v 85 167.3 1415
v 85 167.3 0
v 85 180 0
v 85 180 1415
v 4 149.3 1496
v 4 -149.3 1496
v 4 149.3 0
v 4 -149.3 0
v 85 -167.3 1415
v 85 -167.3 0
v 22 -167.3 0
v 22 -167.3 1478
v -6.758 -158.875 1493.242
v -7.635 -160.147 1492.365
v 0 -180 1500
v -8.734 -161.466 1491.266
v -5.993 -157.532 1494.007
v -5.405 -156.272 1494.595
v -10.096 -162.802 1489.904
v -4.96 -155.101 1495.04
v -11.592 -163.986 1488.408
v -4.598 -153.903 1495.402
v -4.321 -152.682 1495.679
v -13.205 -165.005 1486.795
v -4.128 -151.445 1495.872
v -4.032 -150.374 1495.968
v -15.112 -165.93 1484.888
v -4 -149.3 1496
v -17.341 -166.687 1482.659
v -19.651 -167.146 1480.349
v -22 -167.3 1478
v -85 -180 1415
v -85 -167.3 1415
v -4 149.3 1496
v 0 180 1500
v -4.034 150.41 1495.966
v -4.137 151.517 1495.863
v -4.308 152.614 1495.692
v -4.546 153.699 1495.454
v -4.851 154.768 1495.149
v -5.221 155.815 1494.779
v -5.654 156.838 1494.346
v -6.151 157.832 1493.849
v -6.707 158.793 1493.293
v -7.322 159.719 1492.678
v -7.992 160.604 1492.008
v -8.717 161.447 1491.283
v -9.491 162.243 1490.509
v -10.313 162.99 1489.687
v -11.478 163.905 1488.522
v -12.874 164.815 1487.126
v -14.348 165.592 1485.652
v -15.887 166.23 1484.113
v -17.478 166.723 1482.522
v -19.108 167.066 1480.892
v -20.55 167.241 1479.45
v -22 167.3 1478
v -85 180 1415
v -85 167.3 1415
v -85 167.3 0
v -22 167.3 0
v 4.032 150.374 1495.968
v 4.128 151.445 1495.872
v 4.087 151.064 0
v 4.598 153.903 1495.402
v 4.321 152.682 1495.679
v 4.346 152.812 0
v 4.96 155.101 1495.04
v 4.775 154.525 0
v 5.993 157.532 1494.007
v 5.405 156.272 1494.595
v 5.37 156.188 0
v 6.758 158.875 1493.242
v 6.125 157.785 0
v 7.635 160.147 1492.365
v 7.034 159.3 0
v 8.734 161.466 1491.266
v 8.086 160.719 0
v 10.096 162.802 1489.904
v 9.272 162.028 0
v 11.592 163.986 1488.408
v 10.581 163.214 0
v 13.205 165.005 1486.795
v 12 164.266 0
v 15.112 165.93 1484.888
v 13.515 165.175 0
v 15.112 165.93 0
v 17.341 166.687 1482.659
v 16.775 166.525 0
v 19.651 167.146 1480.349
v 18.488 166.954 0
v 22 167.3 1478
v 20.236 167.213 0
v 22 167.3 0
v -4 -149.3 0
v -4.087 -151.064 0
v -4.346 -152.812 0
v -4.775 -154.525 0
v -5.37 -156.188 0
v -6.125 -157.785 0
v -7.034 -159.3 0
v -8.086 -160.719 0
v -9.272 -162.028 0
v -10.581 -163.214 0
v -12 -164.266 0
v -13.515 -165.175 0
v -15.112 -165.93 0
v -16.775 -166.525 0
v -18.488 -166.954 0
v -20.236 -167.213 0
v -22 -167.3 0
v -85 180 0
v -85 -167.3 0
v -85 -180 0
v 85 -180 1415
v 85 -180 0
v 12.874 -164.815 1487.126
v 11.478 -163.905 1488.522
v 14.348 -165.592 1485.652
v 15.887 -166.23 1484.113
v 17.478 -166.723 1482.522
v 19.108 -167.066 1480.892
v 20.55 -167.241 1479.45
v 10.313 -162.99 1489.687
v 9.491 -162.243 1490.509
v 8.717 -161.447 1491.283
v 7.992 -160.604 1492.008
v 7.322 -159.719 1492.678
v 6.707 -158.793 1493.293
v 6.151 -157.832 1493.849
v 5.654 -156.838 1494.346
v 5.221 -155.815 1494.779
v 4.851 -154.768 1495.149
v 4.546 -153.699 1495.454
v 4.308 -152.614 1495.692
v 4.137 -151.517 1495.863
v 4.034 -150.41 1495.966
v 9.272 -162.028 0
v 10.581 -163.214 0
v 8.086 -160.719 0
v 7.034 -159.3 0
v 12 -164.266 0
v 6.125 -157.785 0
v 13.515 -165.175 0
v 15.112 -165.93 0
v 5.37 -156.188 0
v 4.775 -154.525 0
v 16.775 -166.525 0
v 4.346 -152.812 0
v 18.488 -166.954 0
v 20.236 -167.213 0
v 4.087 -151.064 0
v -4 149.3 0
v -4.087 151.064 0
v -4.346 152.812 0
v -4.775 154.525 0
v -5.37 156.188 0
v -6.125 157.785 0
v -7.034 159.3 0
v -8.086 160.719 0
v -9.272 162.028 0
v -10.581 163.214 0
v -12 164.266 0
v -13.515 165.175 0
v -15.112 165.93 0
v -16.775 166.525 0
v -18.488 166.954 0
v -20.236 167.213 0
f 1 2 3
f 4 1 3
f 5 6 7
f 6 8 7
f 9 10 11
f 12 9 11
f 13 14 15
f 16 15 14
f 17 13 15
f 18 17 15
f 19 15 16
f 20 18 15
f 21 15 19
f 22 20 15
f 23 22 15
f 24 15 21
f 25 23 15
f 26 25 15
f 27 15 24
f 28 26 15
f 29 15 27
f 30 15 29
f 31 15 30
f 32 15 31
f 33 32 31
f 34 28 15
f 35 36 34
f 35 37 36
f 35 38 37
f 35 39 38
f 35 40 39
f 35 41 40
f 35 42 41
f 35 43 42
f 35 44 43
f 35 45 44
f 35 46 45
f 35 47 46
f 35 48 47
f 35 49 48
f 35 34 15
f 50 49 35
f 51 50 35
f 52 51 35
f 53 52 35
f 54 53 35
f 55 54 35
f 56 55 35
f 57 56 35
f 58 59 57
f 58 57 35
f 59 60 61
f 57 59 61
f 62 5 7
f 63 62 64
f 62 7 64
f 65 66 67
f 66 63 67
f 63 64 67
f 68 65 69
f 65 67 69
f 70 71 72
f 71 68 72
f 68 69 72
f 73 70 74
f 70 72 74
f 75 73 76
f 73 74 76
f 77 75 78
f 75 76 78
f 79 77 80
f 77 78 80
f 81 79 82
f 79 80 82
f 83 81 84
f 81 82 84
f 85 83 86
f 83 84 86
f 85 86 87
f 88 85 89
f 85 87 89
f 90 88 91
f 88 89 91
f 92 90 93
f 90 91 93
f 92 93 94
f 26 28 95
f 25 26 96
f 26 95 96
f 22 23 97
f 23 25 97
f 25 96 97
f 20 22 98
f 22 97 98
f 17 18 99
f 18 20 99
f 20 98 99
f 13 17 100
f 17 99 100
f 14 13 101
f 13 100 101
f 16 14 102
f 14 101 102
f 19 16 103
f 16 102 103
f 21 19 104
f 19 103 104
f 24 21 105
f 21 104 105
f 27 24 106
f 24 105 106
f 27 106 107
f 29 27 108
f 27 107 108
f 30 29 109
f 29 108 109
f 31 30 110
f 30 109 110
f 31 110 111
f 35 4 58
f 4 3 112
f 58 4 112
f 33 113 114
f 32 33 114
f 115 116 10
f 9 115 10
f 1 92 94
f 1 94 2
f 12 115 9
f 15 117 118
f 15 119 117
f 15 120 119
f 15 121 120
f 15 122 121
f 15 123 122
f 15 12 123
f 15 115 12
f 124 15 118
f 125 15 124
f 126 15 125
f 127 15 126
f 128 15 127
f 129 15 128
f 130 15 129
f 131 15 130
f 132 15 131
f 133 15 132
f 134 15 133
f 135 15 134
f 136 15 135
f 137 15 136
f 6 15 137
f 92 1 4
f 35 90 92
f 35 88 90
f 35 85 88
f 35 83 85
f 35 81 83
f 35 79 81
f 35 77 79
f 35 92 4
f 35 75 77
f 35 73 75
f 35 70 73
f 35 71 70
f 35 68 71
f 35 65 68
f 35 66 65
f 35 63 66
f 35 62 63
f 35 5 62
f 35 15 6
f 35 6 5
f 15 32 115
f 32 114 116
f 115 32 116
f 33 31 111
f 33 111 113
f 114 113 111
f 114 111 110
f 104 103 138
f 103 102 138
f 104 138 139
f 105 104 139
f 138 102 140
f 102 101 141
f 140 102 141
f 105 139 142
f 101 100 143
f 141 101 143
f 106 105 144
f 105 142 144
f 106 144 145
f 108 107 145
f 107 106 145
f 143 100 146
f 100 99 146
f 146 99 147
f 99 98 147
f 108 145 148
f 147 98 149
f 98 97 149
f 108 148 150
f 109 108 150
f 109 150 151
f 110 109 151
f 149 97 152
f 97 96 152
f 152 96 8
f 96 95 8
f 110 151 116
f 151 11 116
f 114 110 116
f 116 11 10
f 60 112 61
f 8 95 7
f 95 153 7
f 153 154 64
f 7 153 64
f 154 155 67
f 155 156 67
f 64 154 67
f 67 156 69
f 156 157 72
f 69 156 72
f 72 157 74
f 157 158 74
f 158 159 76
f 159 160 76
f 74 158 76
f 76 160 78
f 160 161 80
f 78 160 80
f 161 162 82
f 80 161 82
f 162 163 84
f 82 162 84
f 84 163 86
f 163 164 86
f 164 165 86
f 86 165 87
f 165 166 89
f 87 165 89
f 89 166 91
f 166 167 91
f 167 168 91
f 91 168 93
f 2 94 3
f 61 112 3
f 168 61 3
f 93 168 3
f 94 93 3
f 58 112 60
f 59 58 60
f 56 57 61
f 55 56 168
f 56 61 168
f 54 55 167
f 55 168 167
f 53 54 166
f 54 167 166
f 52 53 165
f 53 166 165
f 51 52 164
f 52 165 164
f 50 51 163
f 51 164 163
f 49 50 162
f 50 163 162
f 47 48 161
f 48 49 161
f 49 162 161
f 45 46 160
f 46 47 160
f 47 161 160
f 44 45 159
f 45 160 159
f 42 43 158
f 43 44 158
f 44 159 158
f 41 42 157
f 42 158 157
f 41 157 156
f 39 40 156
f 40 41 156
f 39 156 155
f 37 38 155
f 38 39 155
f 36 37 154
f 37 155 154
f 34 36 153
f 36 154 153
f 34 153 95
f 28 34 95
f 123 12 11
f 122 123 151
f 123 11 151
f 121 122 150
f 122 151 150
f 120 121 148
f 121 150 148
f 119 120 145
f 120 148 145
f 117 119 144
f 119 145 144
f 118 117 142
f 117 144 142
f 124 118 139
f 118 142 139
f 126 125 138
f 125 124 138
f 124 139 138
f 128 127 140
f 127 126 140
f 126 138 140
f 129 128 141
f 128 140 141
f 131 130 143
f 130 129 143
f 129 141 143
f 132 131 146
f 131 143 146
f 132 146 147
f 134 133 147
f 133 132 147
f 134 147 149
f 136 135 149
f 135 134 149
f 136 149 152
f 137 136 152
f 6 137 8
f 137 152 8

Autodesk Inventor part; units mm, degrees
ref_plane "Start Plane" through (0, 0, 0) normal (0, 0, 1) x (1, 0, 0)
ref_plane "End Plane" through (0, 0, 1500) normal (0, 0, 1) x (1, 0, 0)
sketch "Sketch" plane through (0, 0, 0) normal (0, 0, 1) x (1, 0, 0)
  line L0 (-85, 167.3) -> (-22, 167.3)
  line L1 (-85, 180) -> (-85, 167.3)
  line L2 (85, 180) -> (-85, 180)
  line L3 (85, 167.3) -> (85, 180)
  line L4 (22, 167.3) -> (85, 167.3)
  line L5 (4, -149.3) -> (4, 149.3)
  line L6 (85, -167.3) -> (22, -167.3)
  line L7 (85, -180) -> (85, -167.3)
  line L8 (-85, -167.3) -> (-85, -180)
  line L9 (-22, -167.3) -> (-85, -167.3)
  line L10 (-4, 149.3) -> (-4, -149.3)
  line L11 (0, -252) -> (0, 252) construction
  line L12 (-4, -167.3) -> (4, -167.3) construction
  arc A0 (-22, -167.3) -> (-4, -149.3) centre (-22, -149.3) ccw
  arc A1 (-4, 149.3) -> (-22, 167.3) centre (-22, 149.3) ccw
  arc A2 (22, 167.3) -> (4, 149.3) centre (22, 149.3) ccw
  arc A3 (4, -149.3) -> (22, -167.3) centre (22, -149.3) ccw
  line L13 (-119, 0) -> (119, 0) construction
  line L14 (-85, -180) -> (85, -180)
  point P0 (-4, 167.3)
  point P1 (4, 167.3)
  point P2 (0, 0)
  point P3 (0, -167.3)
  point P4 (0, 0)
  dimension "d1" = 360
  dimension "d3" = 12.7
  dimension "d5" = 8
  dimension "d7" = 170
  dimension "d13" = 18
  dimension "d14" = 180
  dimension "d15" = 85
extrude "Body" add sketch "Sketch" along normal up to surface (1500 mm away) from surface at 0
sketch "Sketch3" plane through (0, 0, 0) normal (0, 0, 1) x (1, 0, 0)
  line L0 (0, 0) -> (10, 0)
ref_plane "Work Plane3" through (0, 0, 0) normal (0, -1, 0) x (1, 0, 0)
ref_plane "Work Plane4" through (85, 0, 1585) normal (-0.7071, 0, 0.7071) x (0.7071, 0, 0.7071)
split "Split1" plane through (85, 0, 1585) removes the side toward (-0.7071, 0, 0.7071)
ref_plane "Work Plane5" through (-85, 0, 1585) normal (0.7071, 0, 0.7071) x (0.7071, 0, -0.7071)
split "Split2" plane through (-85, 0, 1585) removes the side toward (0.7071, 0, 0.7071)
sketch "Sketch4" plane through (0, 0, 0) normal (0, -1, 0) x (1, 0, 0)
  line L0 (-2, 0) -> (12, 0) projected
  line L1 (-2, 1500) -> (12, 1500) projected
  dimension "d19" = 1500
equation "\"d1\" = ParH"
equation "\"d3\" = t2"
equation "\"d5\" = t1"
equation "\"d7\" = b"
equation "\"d13\" = R1"
equation "\"d14\" = 0.5 * d1"
equation "\"d15\" = 0.5 * d7"
equation "\"d8\" = G_L"
equation "\"b\" = 170"
equation "\"ParH\" = 360"
equation "\"R1\" = 18"
equation "\"G_L\" = d19"
equation "\"t1\" = 8"
equation "\"t2\" = 12.7"
equation "\"G_OFFSET_START\" = 0"
equation "\"G_OFFSET_END\" = 0"
properties part number "DIN 1025 - IPE 360-1500" material "Steel, Mild"
